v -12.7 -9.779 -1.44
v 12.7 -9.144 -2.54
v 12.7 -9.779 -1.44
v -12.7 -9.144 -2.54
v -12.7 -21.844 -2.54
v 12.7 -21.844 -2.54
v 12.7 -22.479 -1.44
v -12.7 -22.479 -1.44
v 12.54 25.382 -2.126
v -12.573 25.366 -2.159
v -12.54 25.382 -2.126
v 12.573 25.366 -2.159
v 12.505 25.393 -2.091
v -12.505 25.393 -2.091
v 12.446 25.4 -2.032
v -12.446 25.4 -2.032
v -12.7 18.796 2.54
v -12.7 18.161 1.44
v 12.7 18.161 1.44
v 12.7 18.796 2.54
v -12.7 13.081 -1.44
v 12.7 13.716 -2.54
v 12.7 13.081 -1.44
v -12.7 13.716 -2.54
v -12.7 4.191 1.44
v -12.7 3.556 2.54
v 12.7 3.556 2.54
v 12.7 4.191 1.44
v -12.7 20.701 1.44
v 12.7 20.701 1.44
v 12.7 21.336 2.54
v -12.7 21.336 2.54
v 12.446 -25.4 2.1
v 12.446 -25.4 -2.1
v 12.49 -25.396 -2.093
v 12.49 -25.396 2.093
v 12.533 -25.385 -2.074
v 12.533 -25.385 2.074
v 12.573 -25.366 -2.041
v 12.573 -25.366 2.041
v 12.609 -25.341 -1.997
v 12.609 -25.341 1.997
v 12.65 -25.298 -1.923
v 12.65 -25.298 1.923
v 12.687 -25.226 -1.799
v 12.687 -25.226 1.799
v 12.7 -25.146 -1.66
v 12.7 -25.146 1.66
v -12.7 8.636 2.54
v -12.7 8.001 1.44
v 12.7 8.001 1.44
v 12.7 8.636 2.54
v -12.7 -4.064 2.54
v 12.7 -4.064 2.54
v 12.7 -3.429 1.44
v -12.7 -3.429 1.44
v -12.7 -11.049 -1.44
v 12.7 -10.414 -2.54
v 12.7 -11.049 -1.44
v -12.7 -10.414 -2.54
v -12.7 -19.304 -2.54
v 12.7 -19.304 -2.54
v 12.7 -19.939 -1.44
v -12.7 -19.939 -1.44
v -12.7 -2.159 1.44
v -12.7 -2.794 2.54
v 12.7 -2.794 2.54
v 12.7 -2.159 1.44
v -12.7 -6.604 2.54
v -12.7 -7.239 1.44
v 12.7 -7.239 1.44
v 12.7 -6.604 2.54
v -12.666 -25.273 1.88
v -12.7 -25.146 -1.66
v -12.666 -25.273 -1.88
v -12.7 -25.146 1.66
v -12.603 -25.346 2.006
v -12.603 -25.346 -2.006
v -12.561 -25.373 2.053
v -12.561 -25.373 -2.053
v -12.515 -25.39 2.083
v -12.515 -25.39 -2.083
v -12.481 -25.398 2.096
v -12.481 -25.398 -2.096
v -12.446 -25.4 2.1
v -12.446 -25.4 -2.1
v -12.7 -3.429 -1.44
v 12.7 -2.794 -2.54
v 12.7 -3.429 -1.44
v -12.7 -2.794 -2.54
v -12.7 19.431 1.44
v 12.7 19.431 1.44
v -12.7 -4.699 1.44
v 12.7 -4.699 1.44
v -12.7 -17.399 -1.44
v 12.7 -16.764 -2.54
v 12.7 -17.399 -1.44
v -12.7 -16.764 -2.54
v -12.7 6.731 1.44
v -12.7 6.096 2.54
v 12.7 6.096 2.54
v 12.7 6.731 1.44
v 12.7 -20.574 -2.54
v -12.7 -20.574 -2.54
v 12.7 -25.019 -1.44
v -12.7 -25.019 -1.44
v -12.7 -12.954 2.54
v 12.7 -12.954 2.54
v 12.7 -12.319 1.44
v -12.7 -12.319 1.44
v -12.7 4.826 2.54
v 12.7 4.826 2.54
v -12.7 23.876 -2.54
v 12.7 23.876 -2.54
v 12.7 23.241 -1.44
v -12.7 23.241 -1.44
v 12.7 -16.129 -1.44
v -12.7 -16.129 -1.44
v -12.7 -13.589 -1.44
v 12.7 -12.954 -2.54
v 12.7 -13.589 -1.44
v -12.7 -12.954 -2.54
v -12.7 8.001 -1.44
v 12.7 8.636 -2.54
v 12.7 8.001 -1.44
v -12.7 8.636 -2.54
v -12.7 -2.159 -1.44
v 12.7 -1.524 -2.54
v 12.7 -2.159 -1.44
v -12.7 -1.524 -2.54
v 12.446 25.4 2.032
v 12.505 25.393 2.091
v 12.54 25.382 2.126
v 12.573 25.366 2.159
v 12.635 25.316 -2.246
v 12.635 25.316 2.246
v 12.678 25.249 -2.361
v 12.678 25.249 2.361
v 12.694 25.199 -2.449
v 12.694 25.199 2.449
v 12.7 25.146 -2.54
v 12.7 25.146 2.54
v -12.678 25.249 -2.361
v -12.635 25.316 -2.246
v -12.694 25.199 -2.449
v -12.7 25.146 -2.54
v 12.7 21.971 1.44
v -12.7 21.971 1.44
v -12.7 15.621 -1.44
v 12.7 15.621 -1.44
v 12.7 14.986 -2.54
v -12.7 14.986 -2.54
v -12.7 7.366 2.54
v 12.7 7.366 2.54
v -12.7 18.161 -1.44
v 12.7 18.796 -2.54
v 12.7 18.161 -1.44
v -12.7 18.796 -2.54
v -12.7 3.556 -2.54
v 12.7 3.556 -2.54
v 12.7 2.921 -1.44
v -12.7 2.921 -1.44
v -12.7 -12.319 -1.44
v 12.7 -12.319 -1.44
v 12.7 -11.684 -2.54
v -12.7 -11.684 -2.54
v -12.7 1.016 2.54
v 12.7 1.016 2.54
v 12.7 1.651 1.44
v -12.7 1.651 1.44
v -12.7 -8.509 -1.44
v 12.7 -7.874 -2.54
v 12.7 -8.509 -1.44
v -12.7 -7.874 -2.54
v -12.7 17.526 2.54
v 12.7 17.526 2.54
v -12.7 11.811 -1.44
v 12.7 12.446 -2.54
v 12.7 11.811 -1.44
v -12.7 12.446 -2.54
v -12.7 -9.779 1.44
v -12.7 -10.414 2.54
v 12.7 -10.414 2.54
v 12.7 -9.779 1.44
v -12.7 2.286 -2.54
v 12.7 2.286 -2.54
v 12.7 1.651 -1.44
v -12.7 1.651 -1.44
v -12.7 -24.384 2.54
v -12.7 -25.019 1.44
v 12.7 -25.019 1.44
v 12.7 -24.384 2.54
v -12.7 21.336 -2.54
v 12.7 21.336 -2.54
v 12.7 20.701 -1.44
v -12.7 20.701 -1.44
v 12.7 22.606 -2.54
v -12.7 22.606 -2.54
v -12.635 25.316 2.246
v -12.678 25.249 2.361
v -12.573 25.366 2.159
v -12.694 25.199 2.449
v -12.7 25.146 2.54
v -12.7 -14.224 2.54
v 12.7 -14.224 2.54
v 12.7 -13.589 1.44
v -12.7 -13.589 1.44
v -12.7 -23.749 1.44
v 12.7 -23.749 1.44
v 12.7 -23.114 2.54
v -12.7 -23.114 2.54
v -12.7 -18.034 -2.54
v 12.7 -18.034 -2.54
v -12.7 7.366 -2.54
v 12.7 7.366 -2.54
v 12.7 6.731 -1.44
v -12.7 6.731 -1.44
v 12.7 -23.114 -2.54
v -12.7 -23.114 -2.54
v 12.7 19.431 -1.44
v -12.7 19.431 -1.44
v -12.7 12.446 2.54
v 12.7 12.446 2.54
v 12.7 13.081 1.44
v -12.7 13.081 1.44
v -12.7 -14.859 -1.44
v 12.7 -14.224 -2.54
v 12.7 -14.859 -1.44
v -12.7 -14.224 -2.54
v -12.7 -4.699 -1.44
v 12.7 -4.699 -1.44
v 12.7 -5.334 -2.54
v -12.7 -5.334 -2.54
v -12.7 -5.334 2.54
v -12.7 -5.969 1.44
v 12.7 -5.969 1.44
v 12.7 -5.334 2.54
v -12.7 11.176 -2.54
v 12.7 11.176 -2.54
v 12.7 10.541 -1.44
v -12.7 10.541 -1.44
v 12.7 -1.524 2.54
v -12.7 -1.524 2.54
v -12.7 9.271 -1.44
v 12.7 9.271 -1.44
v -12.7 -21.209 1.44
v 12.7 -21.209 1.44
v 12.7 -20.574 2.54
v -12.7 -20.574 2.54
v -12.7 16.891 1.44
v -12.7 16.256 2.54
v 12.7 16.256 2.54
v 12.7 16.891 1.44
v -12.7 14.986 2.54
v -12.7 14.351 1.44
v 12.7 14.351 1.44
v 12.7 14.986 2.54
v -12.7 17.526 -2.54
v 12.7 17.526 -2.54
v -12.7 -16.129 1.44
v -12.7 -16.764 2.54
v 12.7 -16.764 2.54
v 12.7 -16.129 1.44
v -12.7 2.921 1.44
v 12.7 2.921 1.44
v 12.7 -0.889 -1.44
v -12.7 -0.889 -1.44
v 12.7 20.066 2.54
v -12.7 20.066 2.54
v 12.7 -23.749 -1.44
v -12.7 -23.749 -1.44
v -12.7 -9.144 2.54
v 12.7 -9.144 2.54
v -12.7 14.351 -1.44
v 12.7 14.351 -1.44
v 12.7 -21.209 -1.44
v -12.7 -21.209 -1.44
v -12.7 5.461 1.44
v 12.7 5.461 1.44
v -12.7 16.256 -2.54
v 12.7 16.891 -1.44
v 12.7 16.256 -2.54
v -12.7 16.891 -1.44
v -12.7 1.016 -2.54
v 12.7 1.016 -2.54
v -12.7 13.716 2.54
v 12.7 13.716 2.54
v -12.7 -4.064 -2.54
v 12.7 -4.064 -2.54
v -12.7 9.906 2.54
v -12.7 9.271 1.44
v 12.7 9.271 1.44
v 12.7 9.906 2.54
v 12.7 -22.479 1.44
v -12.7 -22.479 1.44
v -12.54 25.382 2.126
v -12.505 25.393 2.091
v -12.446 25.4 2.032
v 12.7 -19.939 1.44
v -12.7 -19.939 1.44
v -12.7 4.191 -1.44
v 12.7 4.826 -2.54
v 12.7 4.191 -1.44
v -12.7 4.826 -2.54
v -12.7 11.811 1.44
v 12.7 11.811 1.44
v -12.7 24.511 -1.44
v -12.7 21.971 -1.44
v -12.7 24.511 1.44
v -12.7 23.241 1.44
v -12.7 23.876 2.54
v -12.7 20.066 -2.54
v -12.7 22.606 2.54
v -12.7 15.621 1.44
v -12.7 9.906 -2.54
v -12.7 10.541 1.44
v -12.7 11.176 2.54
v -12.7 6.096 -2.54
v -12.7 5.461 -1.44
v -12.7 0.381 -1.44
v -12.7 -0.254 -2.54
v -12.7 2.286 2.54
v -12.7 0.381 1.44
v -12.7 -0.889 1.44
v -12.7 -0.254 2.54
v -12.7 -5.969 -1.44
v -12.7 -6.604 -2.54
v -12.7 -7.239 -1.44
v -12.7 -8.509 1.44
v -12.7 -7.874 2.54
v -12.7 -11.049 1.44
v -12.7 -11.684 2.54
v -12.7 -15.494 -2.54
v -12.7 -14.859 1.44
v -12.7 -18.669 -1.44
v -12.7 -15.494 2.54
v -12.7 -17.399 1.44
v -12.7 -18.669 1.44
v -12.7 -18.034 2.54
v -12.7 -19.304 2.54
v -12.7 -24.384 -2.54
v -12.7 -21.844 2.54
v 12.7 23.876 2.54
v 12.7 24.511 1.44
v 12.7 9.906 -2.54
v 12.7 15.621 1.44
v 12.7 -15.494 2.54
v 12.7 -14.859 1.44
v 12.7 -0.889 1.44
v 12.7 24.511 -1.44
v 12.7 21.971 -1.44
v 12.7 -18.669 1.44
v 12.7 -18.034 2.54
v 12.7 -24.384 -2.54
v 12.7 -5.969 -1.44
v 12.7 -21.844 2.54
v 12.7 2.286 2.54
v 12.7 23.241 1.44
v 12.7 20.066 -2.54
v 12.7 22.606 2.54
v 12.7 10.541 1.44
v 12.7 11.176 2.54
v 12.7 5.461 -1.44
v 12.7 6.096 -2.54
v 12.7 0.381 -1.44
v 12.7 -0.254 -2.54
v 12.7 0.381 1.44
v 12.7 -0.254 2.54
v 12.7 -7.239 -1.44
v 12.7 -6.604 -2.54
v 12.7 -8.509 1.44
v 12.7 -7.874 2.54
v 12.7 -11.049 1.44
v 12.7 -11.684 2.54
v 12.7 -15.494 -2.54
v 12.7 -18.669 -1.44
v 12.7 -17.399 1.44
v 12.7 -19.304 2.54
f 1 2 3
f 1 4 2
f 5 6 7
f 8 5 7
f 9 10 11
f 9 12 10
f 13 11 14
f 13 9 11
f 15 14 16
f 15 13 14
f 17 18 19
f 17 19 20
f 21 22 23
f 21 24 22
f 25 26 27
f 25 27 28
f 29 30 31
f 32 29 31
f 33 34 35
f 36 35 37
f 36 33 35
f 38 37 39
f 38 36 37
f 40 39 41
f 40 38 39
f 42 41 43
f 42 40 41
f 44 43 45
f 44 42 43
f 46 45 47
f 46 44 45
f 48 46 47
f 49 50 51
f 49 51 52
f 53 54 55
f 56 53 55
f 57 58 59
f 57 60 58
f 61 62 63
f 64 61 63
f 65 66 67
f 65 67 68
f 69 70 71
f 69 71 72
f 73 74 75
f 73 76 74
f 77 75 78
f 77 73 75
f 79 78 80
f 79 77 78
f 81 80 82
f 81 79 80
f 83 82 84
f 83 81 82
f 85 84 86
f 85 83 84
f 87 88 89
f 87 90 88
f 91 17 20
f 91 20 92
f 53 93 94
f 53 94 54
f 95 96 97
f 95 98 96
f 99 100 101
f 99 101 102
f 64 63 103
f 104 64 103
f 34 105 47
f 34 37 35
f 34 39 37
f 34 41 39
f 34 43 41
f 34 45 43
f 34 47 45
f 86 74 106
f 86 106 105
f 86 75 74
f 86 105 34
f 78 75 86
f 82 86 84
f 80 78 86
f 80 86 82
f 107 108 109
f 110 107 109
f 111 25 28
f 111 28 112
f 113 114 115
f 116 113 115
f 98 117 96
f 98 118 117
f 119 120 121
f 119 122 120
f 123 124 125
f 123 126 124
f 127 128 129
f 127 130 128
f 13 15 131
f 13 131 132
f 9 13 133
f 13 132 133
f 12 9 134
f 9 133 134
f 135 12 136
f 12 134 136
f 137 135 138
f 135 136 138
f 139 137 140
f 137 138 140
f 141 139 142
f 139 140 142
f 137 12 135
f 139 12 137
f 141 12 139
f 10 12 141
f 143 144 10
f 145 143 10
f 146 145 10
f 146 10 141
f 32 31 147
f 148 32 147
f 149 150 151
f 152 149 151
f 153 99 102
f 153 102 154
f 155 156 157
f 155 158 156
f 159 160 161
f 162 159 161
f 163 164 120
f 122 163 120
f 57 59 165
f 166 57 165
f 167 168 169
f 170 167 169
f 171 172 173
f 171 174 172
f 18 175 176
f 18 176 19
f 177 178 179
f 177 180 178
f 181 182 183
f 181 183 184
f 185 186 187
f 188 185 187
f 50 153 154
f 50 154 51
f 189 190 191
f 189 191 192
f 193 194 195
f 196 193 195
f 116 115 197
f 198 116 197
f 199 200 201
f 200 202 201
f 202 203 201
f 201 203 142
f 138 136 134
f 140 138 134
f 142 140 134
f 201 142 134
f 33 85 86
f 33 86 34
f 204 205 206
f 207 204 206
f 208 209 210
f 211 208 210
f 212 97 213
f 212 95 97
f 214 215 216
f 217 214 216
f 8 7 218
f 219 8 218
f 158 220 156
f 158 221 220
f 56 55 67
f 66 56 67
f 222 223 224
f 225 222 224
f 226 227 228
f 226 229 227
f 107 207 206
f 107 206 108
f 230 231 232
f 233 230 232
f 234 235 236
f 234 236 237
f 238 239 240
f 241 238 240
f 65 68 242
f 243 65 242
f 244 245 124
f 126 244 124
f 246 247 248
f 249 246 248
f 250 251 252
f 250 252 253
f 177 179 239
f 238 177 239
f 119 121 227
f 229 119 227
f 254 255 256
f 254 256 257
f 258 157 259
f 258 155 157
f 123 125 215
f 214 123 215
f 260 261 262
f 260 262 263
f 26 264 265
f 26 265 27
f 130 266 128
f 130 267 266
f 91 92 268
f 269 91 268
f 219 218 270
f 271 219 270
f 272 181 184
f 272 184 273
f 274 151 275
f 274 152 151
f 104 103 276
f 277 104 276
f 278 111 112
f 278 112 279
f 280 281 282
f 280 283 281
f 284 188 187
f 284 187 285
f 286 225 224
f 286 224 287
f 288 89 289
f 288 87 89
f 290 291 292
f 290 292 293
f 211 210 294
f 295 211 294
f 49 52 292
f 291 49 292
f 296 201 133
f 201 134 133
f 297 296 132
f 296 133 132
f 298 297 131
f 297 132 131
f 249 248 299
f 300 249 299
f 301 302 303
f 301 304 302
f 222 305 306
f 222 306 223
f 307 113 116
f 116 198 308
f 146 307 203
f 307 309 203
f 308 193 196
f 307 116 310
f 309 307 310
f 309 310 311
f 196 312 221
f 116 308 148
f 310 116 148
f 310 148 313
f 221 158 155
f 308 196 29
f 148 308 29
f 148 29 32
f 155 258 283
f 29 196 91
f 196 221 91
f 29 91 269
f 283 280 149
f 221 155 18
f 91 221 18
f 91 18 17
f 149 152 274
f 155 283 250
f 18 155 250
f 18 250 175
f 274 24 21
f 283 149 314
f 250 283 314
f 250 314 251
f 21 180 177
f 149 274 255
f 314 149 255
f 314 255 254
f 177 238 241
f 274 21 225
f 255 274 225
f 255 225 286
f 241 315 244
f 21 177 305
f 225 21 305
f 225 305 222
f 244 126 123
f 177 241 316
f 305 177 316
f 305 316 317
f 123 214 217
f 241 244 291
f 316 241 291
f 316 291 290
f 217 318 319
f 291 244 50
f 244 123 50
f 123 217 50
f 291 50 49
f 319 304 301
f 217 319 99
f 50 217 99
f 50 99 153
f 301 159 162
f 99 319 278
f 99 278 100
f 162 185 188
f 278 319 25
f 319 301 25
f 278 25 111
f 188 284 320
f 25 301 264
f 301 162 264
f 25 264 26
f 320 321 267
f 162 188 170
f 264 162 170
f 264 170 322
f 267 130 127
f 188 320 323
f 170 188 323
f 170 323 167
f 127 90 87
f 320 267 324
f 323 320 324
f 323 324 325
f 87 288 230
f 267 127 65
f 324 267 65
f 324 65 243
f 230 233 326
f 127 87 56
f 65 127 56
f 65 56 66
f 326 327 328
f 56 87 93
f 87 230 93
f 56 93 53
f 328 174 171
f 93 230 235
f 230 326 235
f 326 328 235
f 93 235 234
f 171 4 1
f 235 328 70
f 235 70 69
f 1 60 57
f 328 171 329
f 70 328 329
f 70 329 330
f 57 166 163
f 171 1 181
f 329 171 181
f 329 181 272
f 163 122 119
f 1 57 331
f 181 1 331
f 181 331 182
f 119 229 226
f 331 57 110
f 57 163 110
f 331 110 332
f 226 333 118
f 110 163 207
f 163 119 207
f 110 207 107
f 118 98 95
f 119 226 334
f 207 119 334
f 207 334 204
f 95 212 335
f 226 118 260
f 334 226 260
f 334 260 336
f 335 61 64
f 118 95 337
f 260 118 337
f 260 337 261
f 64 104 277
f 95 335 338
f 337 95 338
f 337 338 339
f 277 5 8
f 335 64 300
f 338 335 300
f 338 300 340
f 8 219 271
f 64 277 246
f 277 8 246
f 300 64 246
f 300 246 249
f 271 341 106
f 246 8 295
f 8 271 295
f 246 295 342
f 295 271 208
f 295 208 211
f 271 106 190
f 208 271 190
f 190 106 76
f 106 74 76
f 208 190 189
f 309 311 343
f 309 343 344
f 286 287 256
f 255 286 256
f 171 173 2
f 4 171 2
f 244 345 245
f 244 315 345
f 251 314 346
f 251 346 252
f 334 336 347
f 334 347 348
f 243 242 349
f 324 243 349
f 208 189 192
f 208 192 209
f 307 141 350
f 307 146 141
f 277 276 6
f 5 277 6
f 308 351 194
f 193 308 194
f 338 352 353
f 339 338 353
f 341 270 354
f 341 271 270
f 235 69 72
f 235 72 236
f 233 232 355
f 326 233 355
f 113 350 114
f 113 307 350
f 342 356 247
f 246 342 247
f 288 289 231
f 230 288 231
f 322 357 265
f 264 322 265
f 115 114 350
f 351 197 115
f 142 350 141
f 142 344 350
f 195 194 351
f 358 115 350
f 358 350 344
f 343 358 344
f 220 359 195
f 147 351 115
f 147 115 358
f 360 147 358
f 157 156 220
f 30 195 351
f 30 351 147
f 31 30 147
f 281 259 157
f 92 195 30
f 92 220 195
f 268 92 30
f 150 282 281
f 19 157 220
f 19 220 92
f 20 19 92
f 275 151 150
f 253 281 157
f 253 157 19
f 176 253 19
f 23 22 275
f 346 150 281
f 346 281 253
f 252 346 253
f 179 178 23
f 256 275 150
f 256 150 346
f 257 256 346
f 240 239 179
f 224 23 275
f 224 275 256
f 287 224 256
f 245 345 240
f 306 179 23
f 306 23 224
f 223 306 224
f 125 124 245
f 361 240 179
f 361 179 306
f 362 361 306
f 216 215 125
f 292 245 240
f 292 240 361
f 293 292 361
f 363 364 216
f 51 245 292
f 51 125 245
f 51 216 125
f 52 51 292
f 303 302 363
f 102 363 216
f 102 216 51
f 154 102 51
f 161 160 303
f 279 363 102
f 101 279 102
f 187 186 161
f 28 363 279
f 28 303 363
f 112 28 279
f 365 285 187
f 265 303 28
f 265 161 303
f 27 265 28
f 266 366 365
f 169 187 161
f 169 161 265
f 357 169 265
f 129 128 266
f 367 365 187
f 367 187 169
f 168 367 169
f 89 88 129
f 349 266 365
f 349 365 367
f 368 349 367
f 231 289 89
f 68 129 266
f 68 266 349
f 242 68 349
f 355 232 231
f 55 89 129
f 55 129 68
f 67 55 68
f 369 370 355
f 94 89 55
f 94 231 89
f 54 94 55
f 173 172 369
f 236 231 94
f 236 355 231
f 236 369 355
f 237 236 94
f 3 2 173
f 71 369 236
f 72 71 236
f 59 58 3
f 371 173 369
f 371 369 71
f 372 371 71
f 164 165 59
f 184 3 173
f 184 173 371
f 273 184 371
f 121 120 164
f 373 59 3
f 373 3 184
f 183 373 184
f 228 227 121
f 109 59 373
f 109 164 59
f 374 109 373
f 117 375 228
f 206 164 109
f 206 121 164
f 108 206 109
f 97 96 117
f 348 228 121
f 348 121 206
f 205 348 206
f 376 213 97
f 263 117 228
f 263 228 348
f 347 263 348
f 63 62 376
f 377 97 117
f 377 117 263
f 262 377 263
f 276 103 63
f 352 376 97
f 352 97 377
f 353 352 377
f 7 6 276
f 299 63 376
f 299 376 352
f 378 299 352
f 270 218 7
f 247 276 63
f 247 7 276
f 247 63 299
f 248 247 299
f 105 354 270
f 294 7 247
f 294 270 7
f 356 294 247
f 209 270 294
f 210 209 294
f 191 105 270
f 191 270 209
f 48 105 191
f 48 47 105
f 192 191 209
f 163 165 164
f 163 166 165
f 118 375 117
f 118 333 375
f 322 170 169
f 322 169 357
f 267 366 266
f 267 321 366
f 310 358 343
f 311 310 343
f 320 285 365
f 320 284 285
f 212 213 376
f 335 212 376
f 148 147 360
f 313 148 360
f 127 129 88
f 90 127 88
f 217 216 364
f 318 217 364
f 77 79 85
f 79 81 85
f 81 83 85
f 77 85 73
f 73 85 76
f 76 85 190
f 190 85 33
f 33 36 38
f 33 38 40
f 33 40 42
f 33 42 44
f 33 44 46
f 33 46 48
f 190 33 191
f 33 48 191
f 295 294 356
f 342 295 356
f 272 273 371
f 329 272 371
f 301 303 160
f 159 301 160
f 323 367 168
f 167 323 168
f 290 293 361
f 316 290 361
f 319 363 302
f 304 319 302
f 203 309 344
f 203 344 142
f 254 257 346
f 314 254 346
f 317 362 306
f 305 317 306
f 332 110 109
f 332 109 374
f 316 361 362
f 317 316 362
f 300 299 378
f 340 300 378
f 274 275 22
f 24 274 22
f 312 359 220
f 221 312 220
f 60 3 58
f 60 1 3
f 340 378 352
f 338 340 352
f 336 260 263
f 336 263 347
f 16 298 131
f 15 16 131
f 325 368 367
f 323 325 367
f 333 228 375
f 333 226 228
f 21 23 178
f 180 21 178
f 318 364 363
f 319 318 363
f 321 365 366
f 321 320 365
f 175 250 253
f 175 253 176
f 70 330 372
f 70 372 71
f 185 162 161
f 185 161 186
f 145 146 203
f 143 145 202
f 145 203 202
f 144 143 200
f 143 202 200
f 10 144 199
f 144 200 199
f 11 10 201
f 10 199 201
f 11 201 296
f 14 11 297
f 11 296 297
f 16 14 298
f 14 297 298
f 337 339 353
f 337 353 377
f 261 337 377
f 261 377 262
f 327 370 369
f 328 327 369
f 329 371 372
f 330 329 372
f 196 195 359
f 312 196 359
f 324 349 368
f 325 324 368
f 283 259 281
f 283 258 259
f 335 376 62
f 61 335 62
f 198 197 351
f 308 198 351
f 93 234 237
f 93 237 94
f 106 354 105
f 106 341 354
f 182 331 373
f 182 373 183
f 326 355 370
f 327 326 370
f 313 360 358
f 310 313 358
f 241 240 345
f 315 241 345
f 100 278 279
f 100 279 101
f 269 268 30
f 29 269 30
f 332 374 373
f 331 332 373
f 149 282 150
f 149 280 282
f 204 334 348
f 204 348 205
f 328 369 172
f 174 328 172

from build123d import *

# Parameters (mm, degrees)
F0_W     = 25.4
F0_H     = 5.08
F1_DEPTH = 25.4
F3_DEPTH = 12.7
F4_R     = 0.25399


# Not quite as in the source:
# - a fillet or chamfer is up to 0.001 mm smaller than in the source, because OpenCascade refuses the exact size


with BuildPart() as f1:
    # F0 (on Front) → F1 (new body, symmetric)
    with BuildSketch(Plane.XZ):
        Rectangle(F0_W, F0_H)
    extrude(amount=F1_DEPTH, both=True)

    # F2 (on Right) → F3 (cut, symmetric)
    with BuildSketch(Plane.YZ):
        Polygon((1.6510001588, -1.4401473588), (1.0160001588, -2.5399996216), (0.3810001588, -1.4401473588), (-0.2539998412, -2.5399996216), (-0.8889998412, -1.4401473588), (-1.5239998412, -2.5399996216), (-2.1589998412, -1.4401473588), (-2.7939998412, -2.5399996216), (-3.4289998412, -1.4401473588), (-4.0639998412, -2.5399996216), (-4.6989998412, -1.4401473588), (-5.3339998412, -2.5399996216), (-5.9689998412, -1.4401473588), (-6.6039998412, -2.5399996216), (-7.2389998412, -1.4401473588), (-7.8739998412, -2.5399996216), (-8.5089998412, -1.4401473588), (-9.1439998412, -2.5399996216), (-9.7789998412, -1.4401473588), (-10.4139998412, -2.5399996216), (-11.0489998412, -1.4401473588), (-11.6839998412, -2.5399996216), (-12.3189998412, -1.4401473588), (-12.9539998412, -2.5399996216), (-13.5889998412, -1.4401473588), (-14.2239998412, -2.5399996216), (-14.8589998412, -1.4401473588), (-15.4939998412, -2.5399996216), (-16.1289998412, -1.4401473588), (-16.7639998412, -2.5399996216), (-17.3989998412, -1.4401473588), (-18.0339998412, -2.5399996216), (-18.6689998412, -1.4401473588), (-19.3039998412, -2.5399996216), (-19.9389998412, -1.4401473588), (-20.5739998412, -2.5399996216), (-21.2089998412, -1.4401473588), (-21.8439998412, -2.5399996216), (-22.4789998412, -1.4401473588), (-23.1139998412, -2.5399996216), (-23.7489998412, -1.4401473588), (-24.3839998412, -2.5399996216), (-25.0189998412, -1.4401473588), (-25.6539998412, -2.5399996216), (-26.2889998412, -1.4401473588), (-26.9239998412, -2.5399996216), (-27.5589998412, -1.4401473588), (-28.1939998412, -2.5399996216), (-28.8289998412, -1.4401473588), (-29.4639998412, -2.5399996216), (-29.4639998412, -2.7939996216), (31.4960001588, -2.7939996216), (31.4960001588, -2.5399996216), (30.8610001588, -1.4401473588), (30.2260001588, -2.5399996216), (29.5910001588, -1.4401473588), (28.9560001588, -2.5399996216), (28.3210001588, -1.4401473588), (27.6860001588, -2.5399996216), (27.0510001588, -1.4401473588), (26.4160001588, -2.5399996216), (25.7810001588, -1.4401473588), (25.1460001588, -2.5399996216), (24.5110001588, -1.4401473588), (23.8760001588, -2.5399996216), (23.2410001588, -1.4401473588), (22.6060001588, -2.5399996216), (21.9710001588, -1.4401473588), (21.3360001588, -2.5399996216), (20.7010001588, -1.4401473588), (20.0660001588, -2.5399996216), (19.4310001588, -1.4401473588), (18.7960001588, -2.5399996216), (18.1610001588, -1.4401473588), (17.5260001588, -2.5399996216), (16.8910001588, -1.4401473588), (16.2560001588, -2.5399996216), (15.6210001588, -1.4401473588), (14.9860001588, -2.5399996216), (14.3510001588, -1.4401473588), (13.7160001588, -2.5399996216), (13.0810001588, -1.4401473588), (12.4460001588, -2.5399996216), (11.8110001588, -1.4401473588), (11.1760001588, -2.5399996216), (10.5410001588, -1.4401473588), (9.9060001588, -2.5399996216), (9.2710001588, -1.4401473588), (8.6360001588, -2.5399996216), (8.0010001588, -1.4401473588), (7.3660001588, -2.5399996216), (6.7310001588, -1.4401473588), (6.0960001588, -2.5399996216), (5.4610001588, -1.4401473588), (4.8260001588, -2.5399996216), (4.1910001588, -1.4401473588), (3.5560001588, -2.5399996216), (2.9210001588, -1.4401473588), (2.2860001588, -2.5399996216), align=None)
        Polygon((31.4960001588, 2.5399996216), (31.4960001588, 2.7939996216), (-29.4639998412, 2.7939996216), (-29.4639998412, 2.5399996216), (-28.8289998412, 1.4401473588), (-28.1939998412, 2.5399996216), (-27.5589998412, 1.4401473588), (-26.9239998412, 2.5399996216), (-26.2889998412, 1.4401473588), (-25.6539998412, 2.5399996216), (-25.0189998412, 1.4401473588), (-24.3839998412, 2.5399996216), (-23.7489998412, 1.4401473588), (-23.1139998412, 2.5399996216), (-22.4789998412, 1.4401473588), (-21.8439998412, 2.5399996216), (-21.2089998412, 1.4401473588), (-20.5739998412, 2.5399996216), (-19.9389998412, 1.4401473588), (-19.3039998412, 2.5399996216), (-18.6689998412, 1.4401473588), (-18.0339998412, 2.5399996216), (-17.3989998412, 1.4401473588), (-16.7639998412, 2.5399996216), (-16.1289998412, 1.4401473588), (-15.4939998412, 2.5399996216), (-14.8589998412, 1.4401473588), (-14.2239998412, 2.5399996216), (-13.5889998412, 1.4401473588), (-12.9539998412, 2.5399996216), (-12.3189998412, 1.4401473588), (-11.6839998412, 2.5399996216), (-11.0489998412, 1.4401473588), (-10.4139998412, 2.5399996216), (-9.7789998412, 1.4401473588), (-9.1439998412, 2.5399996216), (-8.5089998412, 1.4401473588), (-7.8739998412, 2.5399996216), (-7.2389998412, 1.4401473588), (-6.6039998412, 2.5399996216), (-5.9689998412, 1.4401473588), (-5.3339998412, 2.5399996216), (-4.6989998412, 1.4401473588), (-4.0639998412, 2.5399996216), (-3.4289998412, 1.4401473588), (-2.7939998412, 2.5399996216), (-2.1589998412, 1.4401473588), (-1.5239998412, 2.5399996216), (-0.8889998412, 1.4401473588), (-0.2539998412, 2.5399996216), (0.3810001588, 1.4401473588), (1.0160001588, 2.5399996216), (1.6510001588, 1.4401473588), (2.2860001588, 2.5399996216), (2.9210001588, 1.4401473588), (3.5560001588, 2.5399996216), (4.1910001588, 1.4401473588), (4.8260001588, 2.5399996216), (5.4610001588, 1.4401473588), (6.0960001588, 2.5399996216), (6.7310001588, 1.4401473588), (7.3660001588, 2.5399996216), (8.0010001588, 1.4401473588), (8.6360001588, 2.5399996216), (9.2710001588, 1.4401473588), (9.9060001588, 2.5399996216), (10.5410001588, 1.4401473588), (11.1760001588, 2.5399996216), (11.8110001588, 1.4401473588), (12.4460001588, 2.5399996216), (13.0810001588, 1.4401473588), (13.7160001588, 2.5399996216), (14.3510001588, 1.4401473588), (14.9860001588, 2.5399996216), (15.6210001588, 1.4401473588), (16.2560001588, 2.5399996216), (16.8910001588, 1.4401473588), (17.5260001588, 2.5399996216), (18.1610001588, 1.4401473588), (18.7960001588, 2.5399996216), (19.4310001588, 1.4401473588), (20.0660001588, 2.5399996216), (20.7010001588, 1.4401473588), (21.3360001588, 2.5399996216), (21.9710001588, 1.4401473588), (22.6060001588, 2.5399996216), (23.2410001588, 1.4401473588), (23.8760001588, 2.5399996216), (24.5110001588, 1.4401473588), (25.1460001588, 2.5399996216), (25.7810001588, 1.4401473588), (26.4160001588, 2.5399996216), (27.0510001588, 1.4401473588), (27.6860001588, 2.5399996216), (28.3210001588, 1.4401473588), (28.9560001588, 2.5399996216), (29.5910001588, 1.4401473588), (30.2260001588, 2.5399996216), (30.8610001588, 1.4401473588), align=None)
    extrude(amount=F3_DEPTH, both=True, mode=Mode.SUBTRACT)

    # F4 (radius 0.254 in the source; OpenCascade refuses exactly that, so slightly less here)
    f4_edges = [f1.edges().sort_by_distance(p)[0] for p in [
        (12.7, -25.4, 0),
        (-12.7, -25.4, 0),
        (-12.7, 25.4, 0),
        (0, 25.4, 2.100059),
        (12.7, 25.4, 0),
        (0, 25.4, -2.100059),
    ]]
    fillet(f4_edges, radius=F4_R)


solid = f1.part
